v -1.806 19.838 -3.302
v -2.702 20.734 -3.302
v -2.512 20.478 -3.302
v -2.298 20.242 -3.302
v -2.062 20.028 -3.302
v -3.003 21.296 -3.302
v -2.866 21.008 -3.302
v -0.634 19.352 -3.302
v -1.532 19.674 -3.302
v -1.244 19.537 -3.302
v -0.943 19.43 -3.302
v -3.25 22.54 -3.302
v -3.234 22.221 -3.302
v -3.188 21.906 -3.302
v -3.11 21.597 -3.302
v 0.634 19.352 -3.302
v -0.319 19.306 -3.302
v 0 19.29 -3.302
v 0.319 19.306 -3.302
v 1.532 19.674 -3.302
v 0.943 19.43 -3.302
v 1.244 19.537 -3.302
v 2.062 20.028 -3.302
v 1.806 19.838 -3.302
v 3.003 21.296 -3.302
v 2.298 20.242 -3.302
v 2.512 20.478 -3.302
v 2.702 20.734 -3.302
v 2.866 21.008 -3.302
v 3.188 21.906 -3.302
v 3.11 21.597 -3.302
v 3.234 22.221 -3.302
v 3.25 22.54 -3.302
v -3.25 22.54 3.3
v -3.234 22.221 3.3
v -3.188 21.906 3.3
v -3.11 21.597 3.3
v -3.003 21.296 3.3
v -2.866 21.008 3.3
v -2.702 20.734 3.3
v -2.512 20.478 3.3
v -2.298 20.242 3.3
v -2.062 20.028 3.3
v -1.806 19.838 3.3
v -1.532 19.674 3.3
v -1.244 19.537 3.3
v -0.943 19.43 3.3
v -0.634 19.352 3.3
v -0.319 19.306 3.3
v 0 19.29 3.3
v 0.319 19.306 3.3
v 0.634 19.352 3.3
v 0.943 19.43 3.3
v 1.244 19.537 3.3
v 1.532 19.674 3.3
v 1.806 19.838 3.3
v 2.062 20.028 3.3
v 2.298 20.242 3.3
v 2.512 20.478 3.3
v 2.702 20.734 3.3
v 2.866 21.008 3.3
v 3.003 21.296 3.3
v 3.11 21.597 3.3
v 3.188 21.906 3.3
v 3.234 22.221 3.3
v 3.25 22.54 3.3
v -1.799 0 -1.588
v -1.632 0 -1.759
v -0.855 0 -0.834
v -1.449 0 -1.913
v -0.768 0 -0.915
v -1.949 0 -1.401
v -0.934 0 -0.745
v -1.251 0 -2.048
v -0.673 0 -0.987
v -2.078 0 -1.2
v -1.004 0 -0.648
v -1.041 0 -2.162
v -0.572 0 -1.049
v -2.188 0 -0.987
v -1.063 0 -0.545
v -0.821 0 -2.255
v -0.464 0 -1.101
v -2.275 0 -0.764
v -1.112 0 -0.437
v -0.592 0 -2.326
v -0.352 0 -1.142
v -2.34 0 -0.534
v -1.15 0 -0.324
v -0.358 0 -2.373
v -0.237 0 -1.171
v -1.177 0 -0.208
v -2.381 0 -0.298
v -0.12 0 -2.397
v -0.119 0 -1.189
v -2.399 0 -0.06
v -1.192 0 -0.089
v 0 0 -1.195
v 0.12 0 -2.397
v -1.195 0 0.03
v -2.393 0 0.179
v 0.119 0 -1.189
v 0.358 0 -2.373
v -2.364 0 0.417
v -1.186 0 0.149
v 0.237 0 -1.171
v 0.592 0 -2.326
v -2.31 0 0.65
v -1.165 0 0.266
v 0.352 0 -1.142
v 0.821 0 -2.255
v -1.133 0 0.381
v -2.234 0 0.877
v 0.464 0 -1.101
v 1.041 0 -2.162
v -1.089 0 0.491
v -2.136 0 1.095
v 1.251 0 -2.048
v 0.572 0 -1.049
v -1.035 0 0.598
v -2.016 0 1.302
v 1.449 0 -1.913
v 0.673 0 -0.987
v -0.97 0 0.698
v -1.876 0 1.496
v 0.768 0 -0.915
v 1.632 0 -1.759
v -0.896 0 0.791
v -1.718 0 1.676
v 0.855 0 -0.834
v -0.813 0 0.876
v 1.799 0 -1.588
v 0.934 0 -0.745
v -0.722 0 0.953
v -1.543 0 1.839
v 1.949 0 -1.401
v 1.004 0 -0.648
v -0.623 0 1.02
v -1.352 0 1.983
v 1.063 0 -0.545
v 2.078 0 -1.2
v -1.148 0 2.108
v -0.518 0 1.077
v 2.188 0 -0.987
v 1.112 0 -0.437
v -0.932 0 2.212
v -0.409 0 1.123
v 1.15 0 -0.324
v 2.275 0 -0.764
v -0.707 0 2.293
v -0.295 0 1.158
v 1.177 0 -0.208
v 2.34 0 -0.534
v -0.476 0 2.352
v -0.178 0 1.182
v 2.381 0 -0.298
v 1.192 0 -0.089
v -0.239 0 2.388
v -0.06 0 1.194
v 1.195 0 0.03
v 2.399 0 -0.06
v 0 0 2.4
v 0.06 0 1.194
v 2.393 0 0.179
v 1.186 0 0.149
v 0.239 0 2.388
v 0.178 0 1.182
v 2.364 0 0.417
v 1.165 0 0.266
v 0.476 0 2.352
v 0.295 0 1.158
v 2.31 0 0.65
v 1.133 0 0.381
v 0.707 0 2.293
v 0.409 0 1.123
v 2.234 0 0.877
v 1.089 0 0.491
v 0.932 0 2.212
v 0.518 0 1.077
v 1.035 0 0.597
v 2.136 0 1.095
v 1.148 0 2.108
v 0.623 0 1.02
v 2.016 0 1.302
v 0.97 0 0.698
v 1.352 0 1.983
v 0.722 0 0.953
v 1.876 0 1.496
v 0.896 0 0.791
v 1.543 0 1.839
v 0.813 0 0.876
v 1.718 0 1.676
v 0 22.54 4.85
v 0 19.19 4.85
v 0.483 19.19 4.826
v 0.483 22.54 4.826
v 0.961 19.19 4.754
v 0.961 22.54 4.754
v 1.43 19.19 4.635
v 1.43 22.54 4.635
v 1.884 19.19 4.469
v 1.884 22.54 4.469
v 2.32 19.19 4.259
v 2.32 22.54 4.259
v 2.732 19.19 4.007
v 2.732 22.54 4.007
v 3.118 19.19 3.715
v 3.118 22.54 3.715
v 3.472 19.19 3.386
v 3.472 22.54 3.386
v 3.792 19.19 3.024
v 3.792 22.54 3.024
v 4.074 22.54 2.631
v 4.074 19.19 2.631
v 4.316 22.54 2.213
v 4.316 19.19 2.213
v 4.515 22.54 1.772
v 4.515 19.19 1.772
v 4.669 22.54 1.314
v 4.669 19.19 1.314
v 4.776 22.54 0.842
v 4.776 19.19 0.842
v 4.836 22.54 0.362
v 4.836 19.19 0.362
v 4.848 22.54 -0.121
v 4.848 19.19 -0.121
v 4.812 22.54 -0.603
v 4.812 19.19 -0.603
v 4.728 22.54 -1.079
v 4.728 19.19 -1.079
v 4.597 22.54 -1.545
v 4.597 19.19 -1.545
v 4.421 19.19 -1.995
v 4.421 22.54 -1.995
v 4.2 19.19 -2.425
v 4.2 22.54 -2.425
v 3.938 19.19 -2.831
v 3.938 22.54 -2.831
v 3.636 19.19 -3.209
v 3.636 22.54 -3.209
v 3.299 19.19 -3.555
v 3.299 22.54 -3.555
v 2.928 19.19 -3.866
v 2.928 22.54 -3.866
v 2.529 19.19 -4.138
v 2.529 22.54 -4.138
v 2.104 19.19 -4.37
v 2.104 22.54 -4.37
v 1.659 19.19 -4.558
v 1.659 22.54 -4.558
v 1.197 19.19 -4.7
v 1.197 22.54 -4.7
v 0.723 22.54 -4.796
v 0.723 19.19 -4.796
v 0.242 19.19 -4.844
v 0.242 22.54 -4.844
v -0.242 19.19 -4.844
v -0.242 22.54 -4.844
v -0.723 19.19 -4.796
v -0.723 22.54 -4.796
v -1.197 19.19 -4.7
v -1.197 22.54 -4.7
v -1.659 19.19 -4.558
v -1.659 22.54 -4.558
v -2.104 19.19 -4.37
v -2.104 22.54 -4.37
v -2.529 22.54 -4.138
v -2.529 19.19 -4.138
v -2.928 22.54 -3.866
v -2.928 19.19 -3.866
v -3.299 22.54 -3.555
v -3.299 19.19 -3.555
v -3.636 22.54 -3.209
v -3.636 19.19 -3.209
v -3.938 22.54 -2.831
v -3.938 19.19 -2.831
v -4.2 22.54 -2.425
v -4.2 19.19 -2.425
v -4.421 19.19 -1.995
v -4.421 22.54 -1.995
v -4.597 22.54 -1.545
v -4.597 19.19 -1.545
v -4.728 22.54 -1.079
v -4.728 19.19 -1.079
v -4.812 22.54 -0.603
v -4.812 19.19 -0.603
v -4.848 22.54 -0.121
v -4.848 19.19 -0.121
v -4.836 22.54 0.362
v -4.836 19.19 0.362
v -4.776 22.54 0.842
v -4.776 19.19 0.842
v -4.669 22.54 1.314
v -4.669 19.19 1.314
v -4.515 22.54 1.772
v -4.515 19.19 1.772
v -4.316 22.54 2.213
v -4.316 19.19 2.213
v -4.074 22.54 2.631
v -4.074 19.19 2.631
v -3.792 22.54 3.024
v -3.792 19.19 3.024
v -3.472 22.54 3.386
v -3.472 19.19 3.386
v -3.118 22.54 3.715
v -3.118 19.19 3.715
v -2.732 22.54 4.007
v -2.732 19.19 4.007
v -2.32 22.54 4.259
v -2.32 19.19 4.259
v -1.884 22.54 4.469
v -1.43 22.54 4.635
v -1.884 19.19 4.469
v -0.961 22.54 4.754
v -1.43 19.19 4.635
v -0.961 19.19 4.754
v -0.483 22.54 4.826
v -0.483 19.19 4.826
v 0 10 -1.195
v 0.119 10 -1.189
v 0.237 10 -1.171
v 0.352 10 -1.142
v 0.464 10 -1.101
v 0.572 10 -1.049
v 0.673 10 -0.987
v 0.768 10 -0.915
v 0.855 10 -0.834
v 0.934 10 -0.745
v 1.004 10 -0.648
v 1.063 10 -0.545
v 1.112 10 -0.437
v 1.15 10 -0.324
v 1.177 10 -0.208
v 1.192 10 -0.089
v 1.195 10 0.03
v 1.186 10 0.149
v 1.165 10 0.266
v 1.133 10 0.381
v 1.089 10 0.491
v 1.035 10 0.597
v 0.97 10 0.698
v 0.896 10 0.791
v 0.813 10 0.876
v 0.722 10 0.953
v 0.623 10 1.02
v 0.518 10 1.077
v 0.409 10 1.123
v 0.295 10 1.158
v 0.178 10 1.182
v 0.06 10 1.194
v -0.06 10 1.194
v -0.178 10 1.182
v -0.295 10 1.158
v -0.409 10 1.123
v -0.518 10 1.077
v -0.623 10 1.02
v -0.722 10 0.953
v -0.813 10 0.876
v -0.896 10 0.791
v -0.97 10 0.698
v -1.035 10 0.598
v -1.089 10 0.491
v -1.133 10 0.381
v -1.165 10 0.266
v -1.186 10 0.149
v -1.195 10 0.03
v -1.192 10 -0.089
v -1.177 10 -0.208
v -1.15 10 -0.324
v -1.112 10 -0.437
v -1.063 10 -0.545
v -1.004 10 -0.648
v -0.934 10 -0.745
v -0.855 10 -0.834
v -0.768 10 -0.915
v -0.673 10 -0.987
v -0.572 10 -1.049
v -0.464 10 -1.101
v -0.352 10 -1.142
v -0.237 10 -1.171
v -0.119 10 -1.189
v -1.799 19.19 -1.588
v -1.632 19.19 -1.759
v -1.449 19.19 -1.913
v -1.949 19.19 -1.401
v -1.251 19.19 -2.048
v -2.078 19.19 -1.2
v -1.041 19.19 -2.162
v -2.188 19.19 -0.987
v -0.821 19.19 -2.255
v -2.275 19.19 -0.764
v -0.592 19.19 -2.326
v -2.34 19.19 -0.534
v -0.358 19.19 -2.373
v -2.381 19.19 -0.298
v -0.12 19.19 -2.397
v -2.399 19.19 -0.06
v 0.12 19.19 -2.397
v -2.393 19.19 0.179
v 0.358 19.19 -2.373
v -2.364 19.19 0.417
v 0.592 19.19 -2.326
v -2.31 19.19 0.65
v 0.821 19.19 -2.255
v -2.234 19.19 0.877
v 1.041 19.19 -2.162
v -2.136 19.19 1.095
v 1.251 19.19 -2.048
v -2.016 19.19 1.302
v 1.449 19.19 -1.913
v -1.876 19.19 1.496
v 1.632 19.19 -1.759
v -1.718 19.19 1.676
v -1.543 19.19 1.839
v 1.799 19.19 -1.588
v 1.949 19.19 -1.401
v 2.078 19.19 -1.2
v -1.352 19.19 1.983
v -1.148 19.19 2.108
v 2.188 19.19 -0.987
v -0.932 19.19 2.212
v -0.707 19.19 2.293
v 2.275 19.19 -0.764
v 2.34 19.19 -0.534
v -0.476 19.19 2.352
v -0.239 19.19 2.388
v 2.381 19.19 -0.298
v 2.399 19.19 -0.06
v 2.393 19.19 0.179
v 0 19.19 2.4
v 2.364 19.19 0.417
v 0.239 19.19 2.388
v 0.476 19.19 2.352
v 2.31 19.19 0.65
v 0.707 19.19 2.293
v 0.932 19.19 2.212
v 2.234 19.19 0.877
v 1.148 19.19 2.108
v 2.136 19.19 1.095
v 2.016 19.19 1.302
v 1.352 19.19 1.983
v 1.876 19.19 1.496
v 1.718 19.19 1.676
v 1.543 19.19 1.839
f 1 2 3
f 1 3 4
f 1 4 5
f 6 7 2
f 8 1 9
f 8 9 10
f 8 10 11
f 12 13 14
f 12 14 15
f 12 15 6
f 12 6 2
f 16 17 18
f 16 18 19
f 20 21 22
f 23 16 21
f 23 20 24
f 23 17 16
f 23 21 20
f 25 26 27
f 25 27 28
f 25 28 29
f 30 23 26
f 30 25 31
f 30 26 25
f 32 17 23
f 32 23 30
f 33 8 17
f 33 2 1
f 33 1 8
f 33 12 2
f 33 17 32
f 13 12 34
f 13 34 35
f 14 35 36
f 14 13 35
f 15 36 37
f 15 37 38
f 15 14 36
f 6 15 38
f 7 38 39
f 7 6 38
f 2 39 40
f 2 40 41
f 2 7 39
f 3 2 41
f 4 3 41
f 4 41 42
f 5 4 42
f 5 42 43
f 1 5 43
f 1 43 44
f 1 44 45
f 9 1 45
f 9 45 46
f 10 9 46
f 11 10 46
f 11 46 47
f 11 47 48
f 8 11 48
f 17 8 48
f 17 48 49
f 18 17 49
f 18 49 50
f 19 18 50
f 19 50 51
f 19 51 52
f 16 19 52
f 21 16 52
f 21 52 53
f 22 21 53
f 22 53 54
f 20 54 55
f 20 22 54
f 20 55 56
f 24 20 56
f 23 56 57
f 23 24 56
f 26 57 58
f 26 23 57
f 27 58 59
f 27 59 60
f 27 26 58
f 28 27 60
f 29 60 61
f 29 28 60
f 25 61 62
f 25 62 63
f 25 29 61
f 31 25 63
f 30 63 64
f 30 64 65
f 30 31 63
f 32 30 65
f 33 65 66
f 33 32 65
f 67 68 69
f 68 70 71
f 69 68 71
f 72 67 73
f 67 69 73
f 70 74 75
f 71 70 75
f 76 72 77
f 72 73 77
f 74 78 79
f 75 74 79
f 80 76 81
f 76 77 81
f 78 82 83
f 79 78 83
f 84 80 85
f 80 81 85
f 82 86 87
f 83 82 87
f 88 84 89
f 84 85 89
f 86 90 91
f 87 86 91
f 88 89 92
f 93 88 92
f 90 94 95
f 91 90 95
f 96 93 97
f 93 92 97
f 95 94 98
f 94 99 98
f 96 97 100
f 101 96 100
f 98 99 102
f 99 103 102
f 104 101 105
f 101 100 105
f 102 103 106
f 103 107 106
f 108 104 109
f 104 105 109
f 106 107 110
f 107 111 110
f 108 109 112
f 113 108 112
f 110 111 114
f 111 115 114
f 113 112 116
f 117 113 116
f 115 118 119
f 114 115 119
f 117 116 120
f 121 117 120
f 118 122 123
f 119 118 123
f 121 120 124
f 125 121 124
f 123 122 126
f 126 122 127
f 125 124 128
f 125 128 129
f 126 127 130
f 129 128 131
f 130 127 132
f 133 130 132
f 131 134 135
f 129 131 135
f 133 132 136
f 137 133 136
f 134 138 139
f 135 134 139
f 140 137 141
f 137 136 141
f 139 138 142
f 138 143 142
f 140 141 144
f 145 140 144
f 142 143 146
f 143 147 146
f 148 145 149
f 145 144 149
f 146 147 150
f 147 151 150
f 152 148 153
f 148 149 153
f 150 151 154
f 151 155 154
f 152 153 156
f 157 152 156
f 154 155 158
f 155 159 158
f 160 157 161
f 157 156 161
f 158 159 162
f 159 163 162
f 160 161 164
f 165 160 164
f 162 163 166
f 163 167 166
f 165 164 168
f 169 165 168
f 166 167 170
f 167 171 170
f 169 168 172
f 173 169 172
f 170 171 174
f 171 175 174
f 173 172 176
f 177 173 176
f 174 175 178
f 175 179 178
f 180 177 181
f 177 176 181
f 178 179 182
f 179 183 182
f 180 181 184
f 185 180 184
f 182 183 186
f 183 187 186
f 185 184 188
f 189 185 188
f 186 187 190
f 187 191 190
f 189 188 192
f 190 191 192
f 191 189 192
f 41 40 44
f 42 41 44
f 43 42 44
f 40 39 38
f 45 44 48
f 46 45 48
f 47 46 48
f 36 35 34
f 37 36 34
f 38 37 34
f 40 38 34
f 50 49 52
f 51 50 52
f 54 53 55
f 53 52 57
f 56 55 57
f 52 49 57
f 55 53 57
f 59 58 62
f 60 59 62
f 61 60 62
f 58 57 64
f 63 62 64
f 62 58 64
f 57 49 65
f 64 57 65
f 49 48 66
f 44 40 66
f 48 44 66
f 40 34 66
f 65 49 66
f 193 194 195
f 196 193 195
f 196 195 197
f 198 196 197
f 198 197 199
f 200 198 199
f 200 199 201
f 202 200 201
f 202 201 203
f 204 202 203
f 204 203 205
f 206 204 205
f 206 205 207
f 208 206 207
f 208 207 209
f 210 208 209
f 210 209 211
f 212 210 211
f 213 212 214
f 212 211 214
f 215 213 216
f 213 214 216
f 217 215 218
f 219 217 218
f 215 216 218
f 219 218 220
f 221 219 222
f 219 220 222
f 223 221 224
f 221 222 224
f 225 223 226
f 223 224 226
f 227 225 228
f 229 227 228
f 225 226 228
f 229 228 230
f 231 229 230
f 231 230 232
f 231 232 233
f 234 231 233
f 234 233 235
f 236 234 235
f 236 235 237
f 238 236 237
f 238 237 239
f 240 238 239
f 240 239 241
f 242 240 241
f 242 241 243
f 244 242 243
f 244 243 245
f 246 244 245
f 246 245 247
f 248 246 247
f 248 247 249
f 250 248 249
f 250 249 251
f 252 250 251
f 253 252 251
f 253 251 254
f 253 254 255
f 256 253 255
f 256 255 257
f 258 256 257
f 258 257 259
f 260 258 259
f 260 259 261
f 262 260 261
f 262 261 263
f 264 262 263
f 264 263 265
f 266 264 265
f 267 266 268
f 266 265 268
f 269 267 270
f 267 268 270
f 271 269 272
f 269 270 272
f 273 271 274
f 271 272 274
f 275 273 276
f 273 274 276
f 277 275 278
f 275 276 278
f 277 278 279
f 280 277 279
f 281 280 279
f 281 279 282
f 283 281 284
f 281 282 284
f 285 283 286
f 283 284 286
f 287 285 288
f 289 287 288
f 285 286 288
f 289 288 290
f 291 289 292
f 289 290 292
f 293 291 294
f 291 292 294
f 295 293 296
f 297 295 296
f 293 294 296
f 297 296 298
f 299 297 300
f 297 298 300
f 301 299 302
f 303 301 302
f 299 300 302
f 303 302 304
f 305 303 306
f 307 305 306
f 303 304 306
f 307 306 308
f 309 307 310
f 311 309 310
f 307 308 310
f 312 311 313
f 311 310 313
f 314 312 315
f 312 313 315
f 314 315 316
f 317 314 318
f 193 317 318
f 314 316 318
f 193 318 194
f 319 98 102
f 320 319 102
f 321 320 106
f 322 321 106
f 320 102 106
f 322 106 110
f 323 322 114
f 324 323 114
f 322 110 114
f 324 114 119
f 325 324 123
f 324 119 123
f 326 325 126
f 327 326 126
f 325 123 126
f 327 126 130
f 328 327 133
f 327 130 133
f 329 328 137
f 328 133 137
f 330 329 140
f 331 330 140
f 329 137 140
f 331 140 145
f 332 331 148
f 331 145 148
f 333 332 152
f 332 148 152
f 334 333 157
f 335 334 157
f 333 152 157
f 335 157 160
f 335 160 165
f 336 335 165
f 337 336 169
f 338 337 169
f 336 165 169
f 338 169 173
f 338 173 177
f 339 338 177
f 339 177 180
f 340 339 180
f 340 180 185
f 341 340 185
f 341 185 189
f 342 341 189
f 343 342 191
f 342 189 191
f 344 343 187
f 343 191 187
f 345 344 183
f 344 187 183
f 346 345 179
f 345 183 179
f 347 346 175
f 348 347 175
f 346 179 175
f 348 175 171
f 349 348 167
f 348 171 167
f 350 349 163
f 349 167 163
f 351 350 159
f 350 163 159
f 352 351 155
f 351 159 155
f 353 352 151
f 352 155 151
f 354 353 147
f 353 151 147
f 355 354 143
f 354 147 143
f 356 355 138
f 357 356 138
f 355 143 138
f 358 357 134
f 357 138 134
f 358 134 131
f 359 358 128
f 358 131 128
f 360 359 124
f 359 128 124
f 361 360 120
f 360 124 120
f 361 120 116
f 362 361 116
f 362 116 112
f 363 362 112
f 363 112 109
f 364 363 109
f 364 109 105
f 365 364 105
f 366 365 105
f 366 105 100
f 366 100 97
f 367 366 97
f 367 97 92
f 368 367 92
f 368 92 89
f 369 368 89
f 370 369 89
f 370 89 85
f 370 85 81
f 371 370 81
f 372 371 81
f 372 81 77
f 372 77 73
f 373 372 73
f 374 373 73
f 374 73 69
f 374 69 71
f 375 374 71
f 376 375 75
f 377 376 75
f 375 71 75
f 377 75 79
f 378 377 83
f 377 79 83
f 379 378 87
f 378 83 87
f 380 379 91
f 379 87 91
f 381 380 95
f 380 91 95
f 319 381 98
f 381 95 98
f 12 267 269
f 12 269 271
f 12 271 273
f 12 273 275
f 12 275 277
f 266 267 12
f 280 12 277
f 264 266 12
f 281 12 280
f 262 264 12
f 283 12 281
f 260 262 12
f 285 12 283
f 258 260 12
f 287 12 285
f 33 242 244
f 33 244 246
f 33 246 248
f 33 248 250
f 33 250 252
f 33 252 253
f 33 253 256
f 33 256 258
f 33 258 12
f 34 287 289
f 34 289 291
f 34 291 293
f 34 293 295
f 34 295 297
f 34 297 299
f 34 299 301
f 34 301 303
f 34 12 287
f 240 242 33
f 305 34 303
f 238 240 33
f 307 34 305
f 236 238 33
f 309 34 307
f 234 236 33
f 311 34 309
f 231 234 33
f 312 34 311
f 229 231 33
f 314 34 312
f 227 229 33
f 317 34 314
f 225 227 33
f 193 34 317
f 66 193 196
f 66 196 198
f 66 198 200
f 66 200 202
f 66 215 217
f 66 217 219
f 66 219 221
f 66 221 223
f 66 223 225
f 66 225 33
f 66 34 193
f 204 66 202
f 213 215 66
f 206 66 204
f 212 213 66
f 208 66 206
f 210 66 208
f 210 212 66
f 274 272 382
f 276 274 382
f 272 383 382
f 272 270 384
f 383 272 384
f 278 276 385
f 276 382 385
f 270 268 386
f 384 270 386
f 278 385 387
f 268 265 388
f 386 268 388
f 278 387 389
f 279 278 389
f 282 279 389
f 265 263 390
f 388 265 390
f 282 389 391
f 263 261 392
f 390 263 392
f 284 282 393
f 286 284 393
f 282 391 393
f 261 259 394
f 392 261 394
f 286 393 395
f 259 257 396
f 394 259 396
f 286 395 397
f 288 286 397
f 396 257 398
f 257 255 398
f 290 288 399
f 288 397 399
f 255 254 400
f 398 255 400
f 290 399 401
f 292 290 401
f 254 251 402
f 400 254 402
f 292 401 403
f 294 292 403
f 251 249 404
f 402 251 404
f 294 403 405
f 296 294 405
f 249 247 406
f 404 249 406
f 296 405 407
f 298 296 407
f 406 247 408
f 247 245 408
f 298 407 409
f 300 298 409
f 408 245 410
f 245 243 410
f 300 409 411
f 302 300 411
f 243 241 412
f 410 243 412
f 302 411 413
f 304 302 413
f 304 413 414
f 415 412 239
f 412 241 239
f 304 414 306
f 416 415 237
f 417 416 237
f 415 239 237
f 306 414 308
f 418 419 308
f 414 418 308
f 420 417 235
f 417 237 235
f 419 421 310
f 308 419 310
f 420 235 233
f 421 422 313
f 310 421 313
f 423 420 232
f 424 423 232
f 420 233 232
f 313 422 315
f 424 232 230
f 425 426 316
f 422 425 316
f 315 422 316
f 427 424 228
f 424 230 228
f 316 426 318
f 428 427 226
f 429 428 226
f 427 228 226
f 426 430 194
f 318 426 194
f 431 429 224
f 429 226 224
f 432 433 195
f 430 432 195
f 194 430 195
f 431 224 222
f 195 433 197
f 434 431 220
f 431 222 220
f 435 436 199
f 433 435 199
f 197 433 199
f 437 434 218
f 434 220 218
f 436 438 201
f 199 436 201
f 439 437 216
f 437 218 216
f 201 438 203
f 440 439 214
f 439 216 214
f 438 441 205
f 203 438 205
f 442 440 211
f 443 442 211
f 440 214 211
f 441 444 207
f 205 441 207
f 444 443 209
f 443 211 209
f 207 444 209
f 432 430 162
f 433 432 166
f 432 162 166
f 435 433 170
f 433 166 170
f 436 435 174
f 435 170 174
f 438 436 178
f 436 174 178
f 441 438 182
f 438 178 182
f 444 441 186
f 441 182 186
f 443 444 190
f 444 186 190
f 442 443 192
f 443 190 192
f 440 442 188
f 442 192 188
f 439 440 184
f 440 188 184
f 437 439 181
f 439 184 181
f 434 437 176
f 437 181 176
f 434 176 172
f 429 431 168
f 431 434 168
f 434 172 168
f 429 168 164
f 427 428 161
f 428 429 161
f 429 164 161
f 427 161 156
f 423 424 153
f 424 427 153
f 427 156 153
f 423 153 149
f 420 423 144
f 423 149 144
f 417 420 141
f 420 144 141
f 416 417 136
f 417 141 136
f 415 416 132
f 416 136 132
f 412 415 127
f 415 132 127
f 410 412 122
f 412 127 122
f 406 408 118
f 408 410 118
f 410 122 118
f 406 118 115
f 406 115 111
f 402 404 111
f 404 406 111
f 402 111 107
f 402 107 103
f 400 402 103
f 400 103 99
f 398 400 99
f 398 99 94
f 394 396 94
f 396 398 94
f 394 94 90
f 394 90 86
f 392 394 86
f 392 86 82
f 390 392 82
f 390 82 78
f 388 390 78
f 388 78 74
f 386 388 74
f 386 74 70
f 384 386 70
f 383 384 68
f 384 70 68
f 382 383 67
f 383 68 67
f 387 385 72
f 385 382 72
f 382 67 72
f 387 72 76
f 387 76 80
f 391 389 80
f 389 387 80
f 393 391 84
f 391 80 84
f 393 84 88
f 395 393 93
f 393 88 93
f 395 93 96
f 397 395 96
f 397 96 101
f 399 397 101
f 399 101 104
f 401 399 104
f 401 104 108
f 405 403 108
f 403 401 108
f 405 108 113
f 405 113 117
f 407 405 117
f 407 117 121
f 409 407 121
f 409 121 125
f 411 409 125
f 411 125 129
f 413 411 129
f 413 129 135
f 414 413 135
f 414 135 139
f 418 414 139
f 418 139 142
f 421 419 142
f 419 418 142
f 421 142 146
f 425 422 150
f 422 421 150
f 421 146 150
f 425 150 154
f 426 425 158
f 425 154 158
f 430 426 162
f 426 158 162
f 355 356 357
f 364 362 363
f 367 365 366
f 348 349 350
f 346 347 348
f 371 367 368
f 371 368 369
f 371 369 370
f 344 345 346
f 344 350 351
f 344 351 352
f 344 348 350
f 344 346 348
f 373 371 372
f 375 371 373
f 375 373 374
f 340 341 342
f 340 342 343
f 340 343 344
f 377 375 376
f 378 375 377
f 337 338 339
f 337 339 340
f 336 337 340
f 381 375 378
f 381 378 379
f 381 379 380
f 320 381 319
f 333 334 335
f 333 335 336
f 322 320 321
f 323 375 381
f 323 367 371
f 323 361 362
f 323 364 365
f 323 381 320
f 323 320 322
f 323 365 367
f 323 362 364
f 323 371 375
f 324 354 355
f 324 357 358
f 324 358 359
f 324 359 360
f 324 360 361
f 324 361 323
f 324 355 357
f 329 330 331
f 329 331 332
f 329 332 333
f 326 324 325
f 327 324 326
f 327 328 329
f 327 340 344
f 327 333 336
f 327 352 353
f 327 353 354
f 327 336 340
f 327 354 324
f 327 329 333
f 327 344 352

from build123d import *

# Parameters (mm, degrees)
SKETCH1_R               = 2.4
BOSS_EXTRUDE1_DEPTH     = 20
SKETCH2_R               = 1.195
CUT_EXTRUDE1_DEPTH      = 10
SKETCH4_R               = 4.85
BOSS_EXTRUDE2_DEPTH     = 2.54
BOSS_EXTRUDE3_START     = -3.35
SKETCH6_R               = 4.85
BOSS_EXTRUDE3_DEPTH     = 3.35
CUT_EXTRUDE3_DEPTH      = 3.3
CUT_EXTRUDE3_DEPTH_BACK = 3.302
SKETCH5_R               = 3.25


with BuildPart() as part:
    # Sketch1 → Boss-Extrude1 (new body)
    with BuildSketch(Plane(origin=(0, 0, 0), x_dir=(1, 0, 0), z_dir=(0, 1, 0))):
        with Locations(Location((0, 0, 0), (0, 0, 270))):
            Circle(SKETCH1_R)
    extrude(amount=BOSS_EXTRUDE1_DEPTH)

    # Sketch2 → Cut-Extrude1 (cut)
    with BuildSketch(Plane.XZ):
        with Locations(Location((0, 0, 0), (0, 0, 270))):
            Circle(SKETCH2_R)
    extrude(amount=-CUT_EXTRUDE1_DEPTH, mode=Mode.SUBTRACT)

    # Sketch4 → Boss-Extrude2 (add)
    with BuildSketch(Plane(origin=(0, 20, 0), x_dir=(1, 0, 0), z_dir=(0, 1, 0))):
        with Locations(Location((0, 0, 0), (0, 0, 270))):
            Circle(SKETCH4_R)
    extrude(amount=BOSS_EXTRUDE2_DEPTH)

    # Sketch6 → Boss-Extrude3 (add)
    with BuildSketch(Plane(origin=(0, 22.54, 0), x_dir=(1, 0, 0), z_dir=(0, 1, 0)).offset(BOSS_EXTRUDE3_START)):
        with Locations(Location((0, 0, 0), (0, 0, 270))):
            Circle(SKETCH6_R)
    extrude(amount=BOSS_EXTRUDE3_DEPTH)

    # Sketch5 → Cut-Extrude3 (cut, two sides: drawn at the far end of the back side and taken through both)
    with BuildSketch(Plane.XY.offset(-CUT_EXTRUDE3_DEPTH_BACK)):
        with Locations((0, 22.54)):
            Circle(SKETCH5_R)
    extrude(amount=CUT_EXTRUDE3_DEPTH + CUT_EXTRUDE3_DEPTH_BACK, mode=Mode.SUBTRACT)


solid = part.part
